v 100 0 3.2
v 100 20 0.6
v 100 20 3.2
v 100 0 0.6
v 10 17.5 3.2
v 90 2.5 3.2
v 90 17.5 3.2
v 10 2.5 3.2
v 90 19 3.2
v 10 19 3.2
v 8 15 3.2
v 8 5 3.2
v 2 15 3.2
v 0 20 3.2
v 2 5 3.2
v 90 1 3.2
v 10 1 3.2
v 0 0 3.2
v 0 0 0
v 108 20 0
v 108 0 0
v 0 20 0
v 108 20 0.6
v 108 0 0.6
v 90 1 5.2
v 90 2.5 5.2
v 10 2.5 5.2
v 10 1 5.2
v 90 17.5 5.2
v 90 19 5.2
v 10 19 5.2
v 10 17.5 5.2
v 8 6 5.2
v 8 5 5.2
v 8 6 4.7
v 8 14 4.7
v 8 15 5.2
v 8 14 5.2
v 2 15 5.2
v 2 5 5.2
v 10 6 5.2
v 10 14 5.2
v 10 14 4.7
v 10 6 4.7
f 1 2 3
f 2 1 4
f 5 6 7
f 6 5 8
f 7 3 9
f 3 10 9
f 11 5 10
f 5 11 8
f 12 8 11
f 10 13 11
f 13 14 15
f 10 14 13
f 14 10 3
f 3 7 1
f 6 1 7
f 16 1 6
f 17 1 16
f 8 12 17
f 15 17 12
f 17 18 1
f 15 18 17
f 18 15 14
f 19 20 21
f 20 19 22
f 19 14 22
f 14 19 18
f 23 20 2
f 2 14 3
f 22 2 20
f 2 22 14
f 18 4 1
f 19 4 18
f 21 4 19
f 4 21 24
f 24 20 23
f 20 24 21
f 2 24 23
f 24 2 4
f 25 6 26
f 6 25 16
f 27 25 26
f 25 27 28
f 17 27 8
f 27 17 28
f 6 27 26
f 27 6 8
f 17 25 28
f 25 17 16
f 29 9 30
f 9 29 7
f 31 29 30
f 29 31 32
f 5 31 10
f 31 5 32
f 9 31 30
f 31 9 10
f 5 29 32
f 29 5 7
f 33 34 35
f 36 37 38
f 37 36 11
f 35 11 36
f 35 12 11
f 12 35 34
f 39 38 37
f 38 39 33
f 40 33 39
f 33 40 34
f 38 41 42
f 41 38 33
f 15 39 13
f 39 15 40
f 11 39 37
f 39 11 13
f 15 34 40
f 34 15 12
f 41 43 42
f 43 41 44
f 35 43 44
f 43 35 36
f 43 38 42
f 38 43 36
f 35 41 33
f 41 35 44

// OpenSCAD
// Bag clip living hinge, PETG, 0.4 nozzle, no supports.
// Two halves contacting at hinge, open flat print pose.
// Fold: rotate upper 180 about [108,10,5.2] -Y. F(x)=216-x, F(z)=10.4-z.

part = "arm_lower"; // [arm_lower, arm_upper, assembly]
cadverify_only = "";

module instance(name, part, unit = 1) {
    echo(cadverify_instance = [name, part, unit]);
    if (cadverify_only == "" || cadverify_only == name) children();
}

module arm_lower() {
    cube([100, 20, 3.2], false);
    translate([99.9, 0, 0]) cube([8.1, 20, 0.6], false);
    translate([10, 1, 3.1]) cube([80, 1.5, 2.1], false);
    translate([10, 17.5, 3.1]) cube([80, 1.5, 2.1], false);
    translate([2, 5, 3.1]) cube([6, 10, 2.1], false);
    translate([7.9, 6, 4.7]) cube([2.1, 8, 0.5], false);
}

module arm_upper() {
    cube([8.1, 20, 0.6], false);
    translate([7.9, 0, 0]) cube([100.1, 20, 3.2], false);
    translate([94, 5, 3.1]) cube([6, 10, 3.3], false);
    translate([98, 6, 5.9]) cube([4, 8, 0.5], false);
    translate([107.9, 6, 0]) cube([8.1, 8, 3.2], false);
}

if (part == "arm_lower") {
    echo(cadverify_spec = [
        ["bounds", [[0, 0, 0], [108, 20, 5.2]]],
        ["bodies", 1],
        ["through_holes", 0],
        ["support_faces", [["bed", "-z", 1500]]],
        ["overhangs_allowed", [["latch lip", [[7.5, 5.5, 4.5], [10.5, 14.5, 5.5]]]]],
        ["copies", 1],
        ["details", [
            ["arm", "material", [[30, 8, 1.2], [70, 12, 2.0]], 1],
            ["arm_wall", "thickness", [50, 10, 10], [0, 0, -1], 3.2],
            ["hinge", "thickness", [104, 10, 5], [0, 0, -1], 0.6],
            ["rib", "material", [[30, 1.3, 3.8], [70, 2.2, 4.8]], 1],
            ["rib2", "material", [[30, 17.8, 3.8], [70, 18.7, 4.8]], 1],
            ["latch_tower", "material", [[3, 7, 3.8], [7, 13, 5.0]], 1],
            ["latch_lip", "material", [[8.3, 7, 4.8], [9.6, 13, 5.1]], 1],
            ["bag_slot", "void", [[30, 4, 3.8], [70, 16, 5.0]], 1]
        ]]
    ]);
    arm_lower();
} else if (part == "arm_upper") {
    echo(cadverify_spec = [
        ["bounds", [[0, 0, 0], [116, 20, 6.4]]],
        ["bodies", 1],
        ["through_holes", 0],
        ["support_faces", [["bed", "-z", 1500]]],
        ["overhangs_allowed", [["latch lip", [[97.5, 5.5, 5.7], [102.5, 14.5, 6.6]]]]],
        ["copies", 1],
        ["details", [
            ["arm", "material", [[30, 8, 1.2], [70, 12, 2.0]], 1],
            ["arm_wall", "thickness", [50, 10, 10], [0, 0, -1], 3.2],
            ["hinge", "thickness", [4, 10, 5], [0, 0, -1], 0.6],
            ["latch_tower", "material", [[94.5, 7, 4.0], [99.5, 13, 5.5]], 1],
            ["latch_lip", "material", [[98.5, 7, 6.0], [101.5, 13, 6.3]], 1],
            ["thumb_tab", "material", [[109, 7, 1.0], [114, 13, 2.2]], 1],
            ["field", "void", [[30, 4, 3.8], [70, 16, 5.0]], 1]
        ]]
    ]);
    arm_upper();
} else if (part == "assembly") {
    echo(cadverify_spec = [
        ["bounds", [[0, 0, 0], [224, 20, 6.4]]],
        ["support_faces", [["bed", "-z", 3000]]],
        ["motions", [
            ["close", ["upper"], "rotate", [108, 10, 5.2], [0, -1, 0], [0, 180],
                ["flex", [["upper", "lower", 1.0, "latch snap"]]],
                ["stops", [180]],
                ["rests", [0, 180]]
            ]
        ]],
        ["assembly_order", [
            [["lower"], [0, 0, 0]],
            [["upper"], [0, 0, -1]]
        ]]
    ]);
    instance("lower", "arm_lower") arm_lower();
    instance("upper", "arm_upper") translate([108, 0, 0]) arm_upper();
}
